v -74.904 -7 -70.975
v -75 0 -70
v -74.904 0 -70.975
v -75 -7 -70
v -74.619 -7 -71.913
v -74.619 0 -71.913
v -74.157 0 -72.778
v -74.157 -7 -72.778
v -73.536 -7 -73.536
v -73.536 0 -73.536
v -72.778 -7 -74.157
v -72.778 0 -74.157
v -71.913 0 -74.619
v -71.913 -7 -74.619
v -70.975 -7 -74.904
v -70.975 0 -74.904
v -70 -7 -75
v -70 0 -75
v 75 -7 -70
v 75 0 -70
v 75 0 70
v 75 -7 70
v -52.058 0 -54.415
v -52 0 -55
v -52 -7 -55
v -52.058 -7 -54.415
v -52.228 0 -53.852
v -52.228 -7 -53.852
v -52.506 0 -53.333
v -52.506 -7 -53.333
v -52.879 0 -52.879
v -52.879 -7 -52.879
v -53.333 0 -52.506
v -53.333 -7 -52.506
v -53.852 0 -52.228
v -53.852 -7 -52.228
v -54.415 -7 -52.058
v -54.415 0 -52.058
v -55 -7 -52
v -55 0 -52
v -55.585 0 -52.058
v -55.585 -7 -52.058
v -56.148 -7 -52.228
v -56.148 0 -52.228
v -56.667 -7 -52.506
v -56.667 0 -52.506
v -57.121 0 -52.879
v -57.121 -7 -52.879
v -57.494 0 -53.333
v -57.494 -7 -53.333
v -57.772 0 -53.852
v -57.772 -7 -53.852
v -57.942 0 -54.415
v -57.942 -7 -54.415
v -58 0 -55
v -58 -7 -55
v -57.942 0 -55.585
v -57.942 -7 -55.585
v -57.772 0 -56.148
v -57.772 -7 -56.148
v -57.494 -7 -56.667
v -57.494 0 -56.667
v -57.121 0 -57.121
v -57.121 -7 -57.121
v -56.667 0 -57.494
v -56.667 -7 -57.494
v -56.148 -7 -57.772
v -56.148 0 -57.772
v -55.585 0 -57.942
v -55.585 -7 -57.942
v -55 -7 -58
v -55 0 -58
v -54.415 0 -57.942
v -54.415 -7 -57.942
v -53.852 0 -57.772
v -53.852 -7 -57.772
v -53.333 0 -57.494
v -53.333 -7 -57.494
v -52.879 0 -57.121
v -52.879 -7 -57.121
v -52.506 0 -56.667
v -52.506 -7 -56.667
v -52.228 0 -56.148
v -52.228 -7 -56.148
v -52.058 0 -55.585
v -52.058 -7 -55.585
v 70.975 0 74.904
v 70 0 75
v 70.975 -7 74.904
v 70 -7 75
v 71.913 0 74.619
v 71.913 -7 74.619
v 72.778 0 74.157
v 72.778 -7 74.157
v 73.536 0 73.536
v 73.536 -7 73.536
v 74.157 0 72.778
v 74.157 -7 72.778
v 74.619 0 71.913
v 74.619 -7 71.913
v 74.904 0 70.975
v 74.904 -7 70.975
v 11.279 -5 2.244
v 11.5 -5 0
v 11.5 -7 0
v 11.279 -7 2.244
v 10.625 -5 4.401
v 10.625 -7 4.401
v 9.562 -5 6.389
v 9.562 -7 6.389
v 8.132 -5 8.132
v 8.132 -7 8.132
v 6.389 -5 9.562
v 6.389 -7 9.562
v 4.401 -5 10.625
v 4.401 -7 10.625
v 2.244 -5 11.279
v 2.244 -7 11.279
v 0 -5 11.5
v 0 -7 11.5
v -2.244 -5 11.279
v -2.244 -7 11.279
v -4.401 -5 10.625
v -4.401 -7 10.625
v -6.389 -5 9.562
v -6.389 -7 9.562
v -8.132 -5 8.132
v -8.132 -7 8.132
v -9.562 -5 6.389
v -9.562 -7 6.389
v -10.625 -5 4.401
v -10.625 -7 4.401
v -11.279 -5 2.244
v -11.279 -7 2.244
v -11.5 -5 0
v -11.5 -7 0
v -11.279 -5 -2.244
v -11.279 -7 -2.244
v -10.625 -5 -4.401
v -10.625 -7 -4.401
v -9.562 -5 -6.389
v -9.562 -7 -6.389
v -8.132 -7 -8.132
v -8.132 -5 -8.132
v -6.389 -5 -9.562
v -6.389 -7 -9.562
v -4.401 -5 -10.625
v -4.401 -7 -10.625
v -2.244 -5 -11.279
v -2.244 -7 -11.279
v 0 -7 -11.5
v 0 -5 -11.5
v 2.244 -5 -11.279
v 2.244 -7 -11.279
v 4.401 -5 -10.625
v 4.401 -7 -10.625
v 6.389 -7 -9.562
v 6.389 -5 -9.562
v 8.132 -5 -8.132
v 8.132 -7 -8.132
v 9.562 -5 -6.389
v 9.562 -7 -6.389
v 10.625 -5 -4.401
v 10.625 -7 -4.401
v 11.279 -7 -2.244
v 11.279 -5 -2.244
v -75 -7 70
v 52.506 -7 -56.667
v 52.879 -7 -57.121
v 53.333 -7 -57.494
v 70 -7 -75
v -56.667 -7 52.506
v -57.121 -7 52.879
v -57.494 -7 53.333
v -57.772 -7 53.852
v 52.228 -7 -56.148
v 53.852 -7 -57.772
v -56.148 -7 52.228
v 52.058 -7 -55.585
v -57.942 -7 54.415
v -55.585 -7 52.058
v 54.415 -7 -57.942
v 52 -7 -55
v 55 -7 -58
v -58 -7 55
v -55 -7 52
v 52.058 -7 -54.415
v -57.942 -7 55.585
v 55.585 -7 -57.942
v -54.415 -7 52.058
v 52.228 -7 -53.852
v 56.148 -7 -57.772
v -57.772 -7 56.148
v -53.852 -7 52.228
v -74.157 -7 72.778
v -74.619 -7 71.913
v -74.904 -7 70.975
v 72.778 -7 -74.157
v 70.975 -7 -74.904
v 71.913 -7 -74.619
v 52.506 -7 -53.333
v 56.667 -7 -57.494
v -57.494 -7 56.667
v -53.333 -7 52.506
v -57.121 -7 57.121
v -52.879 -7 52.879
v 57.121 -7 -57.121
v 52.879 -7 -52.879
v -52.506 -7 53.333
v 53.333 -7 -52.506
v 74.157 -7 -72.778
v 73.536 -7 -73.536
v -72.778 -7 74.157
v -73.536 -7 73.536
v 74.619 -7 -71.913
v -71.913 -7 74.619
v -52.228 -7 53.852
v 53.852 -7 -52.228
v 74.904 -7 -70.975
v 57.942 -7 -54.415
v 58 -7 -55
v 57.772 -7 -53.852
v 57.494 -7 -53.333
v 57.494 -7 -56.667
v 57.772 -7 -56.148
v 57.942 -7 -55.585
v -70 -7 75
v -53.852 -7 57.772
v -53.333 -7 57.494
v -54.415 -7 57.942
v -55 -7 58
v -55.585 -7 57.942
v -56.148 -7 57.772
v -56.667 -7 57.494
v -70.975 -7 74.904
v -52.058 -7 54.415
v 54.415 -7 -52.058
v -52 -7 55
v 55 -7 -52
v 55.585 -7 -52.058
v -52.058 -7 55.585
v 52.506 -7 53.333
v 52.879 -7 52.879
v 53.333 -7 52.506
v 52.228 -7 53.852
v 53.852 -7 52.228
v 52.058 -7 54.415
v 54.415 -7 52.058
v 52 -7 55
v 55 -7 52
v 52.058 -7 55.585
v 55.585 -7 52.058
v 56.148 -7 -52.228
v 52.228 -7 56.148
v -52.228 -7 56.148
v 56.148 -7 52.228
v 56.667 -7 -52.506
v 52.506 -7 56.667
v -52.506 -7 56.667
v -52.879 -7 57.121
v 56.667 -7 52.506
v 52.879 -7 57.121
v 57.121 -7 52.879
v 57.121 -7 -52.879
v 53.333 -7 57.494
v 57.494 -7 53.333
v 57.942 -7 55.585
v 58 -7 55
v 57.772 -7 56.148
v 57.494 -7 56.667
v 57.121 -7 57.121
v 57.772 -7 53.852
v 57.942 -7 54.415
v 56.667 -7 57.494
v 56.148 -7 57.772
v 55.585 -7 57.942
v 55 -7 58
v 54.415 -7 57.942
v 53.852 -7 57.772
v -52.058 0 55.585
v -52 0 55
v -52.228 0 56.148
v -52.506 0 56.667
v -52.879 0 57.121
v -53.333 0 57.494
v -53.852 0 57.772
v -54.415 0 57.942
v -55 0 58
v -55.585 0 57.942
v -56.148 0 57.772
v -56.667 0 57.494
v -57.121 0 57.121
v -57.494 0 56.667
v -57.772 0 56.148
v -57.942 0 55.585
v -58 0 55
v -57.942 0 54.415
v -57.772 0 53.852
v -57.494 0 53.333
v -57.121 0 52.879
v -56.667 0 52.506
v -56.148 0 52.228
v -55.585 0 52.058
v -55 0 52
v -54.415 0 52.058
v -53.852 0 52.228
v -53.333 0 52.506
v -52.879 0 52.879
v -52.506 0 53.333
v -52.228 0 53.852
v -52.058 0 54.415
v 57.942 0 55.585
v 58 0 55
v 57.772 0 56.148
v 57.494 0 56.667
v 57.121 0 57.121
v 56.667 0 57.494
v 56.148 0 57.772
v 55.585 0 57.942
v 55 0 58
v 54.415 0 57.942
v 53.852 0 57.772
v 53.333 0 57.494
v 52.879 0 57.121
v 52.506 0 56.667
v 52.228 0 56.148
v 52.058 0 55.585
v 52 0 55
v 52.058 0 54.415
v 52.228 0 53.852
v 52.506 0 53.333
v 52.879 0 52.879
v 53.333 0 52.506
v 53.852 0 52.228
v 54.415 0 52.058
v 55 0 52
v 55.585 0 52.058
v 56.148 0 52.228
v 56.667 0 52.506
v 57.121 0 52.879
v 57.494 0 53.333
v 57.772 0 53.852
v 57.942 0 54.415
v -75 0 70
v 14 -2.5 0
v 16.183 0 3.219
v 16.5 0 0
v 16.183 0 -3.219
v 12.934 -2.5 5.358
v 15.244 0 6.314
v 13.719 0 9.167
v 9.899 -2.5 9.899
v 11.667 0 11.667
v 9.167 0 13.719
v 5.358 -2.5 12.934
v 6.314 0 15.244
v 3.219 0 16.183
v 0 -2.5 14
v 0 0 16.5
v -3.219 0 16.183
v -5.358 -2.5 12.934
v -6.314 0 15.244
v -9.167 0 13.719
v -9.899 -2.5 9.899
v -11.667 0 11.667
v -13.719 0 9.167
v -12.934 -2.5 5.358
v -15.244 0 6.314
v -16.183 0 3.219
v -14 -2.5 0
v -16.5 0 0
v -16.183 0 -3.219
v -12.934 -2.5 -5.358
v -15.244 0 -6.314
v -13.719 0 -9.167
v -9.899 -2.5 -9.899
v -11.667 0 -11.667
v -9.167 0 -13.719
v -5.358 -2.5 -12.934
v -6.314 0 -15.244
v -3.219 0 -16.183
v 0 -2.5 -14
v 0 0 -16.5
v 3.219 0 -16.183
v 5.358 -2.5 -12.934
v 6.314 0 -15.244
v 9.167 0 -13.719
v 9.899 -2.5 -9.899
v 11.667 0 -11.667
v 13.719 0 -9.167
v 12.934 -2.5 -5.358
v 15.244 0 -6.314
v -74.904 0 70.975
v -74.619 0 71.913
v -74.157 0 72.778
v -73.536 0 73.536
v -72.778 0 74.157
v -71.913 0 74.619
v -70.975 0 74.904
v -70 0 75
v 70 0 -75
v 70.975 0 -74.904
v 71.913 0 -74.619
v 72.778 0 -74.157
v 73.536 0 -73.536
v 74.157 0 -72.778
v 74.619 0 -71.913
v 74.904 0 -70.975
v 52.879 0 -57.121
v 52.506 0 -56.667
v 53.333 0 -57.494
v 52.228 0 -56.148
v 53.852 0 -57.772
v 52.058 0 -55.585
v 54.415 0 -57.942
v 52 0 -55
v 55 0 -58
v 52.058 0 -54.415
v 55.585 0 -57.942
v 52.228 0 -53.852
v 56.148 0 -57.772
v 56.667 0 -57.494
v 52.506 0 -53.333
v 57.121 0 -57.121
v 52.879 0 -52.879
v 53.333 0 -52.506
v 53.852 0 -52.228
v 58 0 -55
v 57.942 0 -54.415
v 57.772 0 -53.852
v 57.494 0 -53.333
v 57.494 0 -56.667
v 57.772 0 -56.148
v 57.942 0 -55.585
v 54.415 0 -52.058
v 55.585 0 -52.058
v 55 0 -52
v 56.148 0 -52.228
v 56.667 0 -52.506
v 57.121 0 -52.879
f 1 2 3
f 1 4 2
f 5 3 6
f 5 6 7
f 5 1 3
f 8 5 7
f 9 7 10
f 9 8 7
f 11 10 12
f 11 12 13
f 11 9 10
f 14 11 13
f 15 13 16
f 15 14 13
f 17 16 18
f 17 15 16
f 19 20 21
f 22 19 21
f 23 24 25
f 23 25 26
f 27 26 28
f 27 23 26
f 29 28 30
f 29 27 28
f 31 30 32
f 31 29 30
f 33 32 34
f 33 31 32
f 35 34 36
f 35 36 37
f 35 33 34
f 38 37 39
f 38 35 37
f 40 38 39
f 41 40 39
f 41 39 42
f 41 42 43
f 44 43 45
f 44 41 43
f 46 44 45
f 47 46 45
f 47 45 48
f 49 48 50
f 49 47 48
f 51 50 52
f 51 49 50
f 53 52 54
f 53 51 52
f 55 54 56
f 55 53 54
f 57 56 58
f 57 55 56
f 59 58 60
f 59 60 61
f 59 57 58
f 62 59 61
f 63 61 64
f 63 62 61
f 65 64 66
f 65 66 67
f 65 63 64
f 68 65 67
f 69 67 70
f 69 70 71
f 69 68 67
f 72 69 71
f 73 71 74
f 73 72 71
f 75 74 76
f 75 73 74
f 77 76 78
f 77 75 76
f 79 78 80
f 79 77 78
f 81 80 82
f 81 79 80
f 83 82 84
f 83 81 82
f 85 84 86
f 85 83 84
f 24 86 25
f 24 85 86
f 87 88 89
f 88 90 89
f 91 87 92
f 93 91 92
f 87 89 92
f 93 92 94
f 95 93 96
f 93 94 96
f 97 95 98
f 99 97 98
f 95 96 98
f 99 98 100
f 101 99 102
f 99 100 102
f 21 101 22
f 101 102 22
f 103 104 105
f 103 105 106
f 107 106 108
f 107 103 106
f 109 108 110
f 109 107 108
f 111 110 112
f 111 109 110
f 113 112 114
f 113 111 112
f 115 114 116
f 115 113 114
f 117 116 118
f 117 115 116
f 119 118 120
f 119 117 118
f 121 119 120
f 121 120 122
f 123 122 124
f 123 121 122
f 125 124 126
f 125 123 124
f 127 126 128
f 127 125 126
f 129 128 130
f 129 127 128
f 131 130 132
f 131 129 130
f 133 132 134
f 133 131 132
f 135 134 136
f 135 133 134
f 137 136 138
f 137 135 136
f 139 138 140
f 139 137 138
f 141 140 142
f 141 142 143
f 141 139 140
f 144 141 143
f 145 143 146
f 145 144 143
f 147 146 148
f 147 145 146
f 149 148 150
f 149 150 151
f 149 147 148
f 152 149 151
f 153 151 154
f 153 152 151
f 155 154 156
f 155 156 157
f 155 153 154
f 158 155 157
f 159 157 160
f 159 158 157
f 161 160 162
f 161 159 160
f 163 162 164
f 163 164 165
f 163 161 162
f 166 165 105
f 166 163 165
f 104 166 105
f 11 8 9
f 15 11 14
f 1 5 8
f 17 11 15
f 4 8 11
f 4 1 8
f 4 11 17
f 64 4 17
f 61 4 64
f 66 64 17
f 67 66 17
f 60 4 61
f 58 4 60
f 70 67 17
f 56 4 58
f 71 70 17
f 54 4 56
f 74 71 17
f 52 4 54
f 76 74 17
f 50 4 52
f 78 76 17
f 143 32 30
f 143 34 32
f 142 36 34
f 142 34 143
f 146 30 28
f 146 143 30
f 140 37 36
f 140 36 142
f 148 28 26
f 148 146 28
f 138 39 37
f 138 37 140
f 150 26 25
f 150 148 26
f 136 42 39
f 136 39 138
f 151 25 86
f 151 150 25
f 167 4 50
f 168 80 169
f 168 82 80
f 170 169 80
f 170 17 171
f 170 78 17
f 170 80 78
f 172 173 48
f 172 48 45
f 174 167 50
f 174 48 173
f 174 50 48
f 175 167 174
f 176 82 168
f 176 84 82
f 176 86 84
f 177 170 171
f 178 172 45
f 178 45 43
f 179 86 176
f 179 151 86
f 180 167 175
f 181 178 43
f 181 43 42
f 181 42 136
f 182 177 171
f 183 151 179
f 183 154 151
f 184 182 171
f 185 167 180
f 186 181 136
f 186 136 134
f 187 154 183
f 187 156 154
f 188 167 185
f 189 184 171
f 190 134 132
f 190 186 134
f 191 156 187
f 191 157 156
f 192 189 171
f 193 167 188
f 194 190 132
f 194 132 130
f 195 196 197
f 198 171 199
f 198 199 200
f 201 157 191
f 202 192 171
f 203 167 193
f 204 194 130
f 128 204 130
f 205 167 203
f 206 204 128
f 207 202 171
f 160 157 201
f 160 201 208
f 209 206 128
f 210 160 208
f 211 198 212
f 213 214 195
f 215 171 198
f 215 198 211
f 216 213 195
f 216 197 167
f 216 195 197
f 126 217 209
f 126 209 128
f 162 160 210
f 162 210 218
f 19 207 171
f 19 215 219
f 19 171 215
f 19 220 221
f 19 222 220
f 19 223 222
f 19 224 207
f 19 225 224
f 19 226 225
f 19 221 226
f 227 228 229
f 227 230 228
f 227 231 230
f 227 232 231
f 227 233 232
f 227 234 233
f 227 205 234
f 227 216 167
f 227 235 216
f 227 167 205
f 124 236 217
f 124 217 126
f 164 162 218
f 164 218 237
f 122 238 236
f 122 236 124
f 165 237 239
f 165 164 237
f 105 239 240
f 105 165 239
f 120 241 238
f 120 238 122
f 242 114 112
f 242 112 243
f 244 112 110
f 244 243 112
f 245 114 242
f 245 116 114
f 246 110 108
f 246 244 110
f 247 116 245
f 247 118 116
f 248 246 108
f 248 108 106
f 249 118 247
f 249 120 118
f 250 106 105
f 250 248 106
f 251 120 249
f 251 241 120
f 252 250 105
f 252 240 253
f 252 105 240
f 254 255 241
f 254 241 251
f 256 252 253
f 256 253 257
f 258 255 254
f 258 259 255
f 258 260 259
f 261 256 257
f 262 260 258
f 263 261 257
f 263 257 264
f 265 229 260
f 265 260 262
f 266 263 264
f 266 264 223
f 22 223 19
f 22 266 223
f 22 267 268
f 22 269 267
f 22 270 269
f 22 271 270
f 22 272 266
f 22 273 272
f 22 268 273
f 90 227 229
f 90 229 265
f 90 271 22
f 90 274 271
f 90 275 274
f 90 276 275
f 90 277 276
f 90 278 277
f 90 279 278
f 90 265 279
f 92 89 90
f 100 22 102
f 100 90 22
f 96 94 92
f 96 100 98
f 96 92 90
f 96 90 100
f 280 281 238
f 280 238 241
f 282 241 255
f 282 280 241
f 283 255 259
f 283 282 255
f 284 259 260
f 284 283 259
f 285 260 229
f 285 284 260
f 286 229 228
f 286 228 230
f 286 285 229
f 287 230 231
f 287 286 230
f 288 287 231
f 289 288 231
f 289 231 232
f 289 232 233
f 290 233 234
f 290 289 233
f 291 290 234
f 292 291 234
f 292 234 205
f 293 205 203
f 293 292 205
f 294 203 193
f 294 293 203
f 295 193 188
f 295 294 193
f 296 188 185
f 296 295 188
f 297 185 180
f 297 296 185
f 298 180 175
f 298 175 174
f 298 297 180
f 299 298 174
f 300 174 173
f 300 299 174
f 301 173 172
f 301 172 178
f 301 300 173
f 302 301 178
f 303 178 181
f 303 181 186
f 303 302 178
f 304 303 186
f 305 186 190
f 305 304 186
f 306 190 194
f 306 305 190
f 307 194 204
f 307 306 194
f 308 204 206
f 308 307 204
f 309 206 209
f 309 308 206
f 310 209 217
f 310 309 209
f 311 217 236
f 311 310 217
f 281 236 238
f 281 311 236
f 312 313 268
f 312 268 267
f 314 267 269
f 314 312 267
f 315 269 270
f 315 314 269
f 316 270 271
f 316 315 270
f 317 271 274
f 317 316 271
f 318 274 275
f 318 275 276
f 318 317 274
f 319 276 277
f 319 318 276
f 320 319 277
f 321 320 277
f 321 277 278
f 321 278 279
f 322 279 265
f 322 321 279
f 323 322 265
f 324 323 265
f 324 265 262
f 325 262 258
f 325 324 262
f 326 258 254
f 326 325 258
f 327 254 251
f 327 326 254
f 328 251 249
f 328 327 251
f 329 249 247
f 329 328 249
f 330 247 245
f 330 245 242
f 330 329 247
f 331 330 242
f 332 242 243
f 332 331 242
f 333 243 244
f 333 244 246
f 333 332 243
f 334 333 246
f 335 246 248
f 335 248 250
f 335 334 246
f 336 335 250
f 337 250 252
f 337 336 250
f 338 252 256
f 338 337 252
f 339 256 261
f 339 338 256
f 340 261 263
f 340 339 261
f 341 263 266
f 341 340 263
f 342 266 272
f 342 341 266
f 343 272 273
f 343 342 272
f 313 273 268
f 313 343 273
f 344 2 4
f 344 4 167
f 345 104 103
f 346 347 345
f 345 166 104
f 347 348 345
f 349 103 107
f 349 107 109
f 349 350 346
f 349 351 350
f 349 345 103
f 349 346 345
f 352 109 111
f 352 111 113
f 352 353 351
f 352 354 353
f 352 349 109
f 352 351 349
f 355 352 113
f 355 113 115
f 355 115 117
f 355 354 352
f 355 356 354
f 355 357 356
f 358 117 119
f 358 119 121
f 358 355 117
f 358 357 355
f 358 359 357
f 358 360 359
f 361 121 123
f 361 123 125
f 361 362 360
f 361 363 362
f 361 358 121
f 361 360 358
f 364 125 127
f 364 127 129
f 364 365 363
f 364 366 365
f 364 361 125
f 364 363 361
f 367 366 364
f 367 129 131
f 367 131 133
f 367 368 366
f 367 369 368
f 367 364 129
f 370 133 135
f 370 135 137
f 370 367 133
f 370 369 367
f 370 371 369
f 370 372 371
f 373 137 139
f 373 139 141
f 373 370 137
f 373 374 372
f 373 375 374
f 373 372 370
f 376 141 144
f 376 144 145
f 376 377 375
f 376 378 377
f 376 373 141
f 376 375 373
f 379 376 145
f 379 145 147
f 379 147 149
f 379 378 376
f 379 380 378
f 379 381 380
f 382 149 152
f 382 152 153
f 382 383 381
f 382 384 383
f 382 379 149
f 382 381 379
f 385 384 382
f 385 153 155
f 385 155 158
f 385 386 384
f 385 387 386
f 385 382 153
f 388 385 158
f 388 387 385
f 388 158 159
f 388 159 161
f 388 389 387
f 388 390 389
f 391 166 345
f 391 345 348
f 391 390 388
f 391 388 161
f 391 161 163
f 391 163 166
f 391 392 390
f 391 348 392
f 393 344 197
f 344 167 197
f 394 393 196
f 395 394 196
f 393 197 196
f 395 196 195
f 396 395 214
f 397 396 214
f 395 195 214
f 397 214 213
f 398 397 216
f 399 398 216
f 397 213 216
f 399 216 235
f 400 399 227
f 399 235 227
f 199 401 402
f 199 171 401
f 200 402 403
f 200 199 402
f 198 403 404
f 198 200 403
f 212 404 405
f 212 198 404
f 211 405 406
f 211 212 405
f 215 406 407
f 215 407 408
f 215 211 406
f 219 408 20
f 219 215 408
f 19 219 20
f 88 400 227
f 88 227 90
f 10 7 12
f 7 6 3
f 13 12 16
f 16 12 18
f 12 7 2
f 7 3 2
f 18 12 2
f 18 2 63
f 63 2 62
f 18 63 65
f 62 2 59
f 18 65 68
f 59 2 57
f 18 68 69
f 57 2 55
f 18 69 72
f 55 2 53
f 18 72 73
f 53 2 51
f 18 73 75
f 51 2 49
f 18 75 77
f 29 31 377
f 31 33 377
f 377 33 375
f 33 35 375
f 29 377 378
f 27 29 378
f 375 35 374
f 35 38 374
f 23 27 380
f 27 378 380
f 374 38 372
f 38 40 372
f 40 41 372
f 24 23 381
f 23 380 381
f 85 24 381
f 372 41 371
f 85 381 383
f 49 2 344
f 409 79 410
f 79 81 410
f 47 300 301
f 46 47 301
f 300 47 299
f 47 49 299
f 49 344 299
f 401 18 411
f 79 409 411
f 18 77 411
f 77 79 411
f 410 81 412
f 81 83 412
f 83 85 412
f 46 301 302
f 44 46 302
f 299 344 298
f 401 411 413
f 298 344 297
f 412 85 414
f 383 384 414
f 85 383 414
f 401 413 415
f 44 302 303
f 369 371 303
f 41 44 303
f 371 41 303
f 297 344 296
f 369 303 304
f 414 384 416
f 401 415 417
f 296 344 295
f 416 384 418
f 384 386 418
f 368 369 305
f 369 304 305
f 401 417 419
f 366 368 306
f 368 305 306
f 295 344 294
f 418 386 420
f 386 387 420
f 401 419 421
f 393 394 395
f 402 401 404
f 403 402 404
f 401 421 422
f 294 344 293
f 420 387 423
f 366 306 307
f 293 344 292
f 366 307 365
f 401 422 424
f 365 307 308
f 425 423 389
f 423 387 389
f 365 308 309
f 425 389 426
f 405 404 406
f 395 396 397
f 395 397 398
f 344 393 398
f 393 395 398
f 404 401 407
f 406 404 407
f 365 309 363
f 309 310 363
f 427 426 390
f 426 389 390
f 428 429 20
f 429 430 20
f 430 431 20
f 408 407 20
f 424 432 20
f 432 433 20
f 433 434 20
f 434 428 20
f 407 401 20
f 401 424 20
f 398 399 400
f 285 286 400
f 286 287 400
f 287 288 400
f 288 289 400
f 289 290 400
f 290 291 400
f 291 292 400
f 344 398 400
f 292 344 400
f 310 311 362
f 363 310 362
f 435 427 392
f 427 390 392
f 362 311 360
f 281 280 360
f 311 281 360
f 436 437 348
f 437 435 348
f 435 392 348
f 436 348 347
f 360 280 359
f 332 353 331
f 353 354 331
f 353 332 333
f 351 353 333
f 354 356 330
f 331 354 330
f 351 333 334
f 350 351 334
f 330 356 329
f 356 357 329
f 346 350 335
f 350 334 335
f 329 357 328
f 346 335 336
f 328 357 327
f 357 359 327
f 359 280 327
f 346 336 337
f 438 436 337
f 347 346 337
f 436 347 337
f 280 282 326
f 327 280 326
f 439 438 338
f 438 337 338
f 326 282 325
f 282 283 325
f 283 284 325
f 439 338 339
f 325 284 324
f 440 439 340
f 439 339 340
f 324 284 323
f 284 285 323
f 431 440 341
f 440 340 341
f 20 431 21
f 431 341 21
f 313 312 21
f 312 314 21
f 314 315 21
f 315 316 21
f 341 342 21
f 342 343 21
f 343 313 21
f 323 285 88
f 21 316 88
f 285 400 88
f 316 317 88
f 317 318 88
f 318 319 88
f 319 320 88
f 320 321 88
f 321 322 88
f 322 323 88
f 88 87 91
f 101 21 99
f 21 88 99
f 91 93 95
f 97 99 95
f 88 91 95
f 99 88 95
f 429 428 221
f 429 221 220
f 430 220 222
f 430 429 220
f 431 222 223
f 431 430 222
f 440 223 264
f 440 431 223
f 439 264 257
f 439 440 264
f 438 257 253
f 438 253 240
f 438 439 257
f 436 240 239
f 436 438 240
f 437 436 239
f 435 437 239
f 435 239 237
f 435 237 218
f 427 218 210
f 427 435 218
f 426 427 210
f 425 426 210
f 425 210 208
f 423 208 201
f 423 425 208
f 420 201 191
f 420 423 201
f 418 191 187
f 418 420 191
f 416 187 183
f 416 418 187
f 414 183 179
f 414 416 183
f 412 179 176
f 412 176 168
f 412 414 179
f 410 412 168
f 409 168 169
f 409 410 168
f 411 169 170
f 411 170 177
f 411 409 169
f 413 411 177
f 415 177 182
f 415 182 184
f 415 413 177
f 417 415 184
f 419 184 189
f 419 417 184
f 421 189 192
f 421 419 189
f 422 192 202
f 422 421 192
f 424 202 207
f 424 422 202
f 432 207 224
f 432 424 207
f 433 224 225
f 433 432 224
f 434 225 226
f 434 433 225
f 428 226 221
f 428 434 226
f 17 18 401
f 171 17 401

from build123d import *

# Parameters (mm, degrees)
F0_W     = 150
F0_H     = 150
F0_R     = 3
F0_R_2   = 11.5
F1_DEPTH = 7
F2_SIZE  = 5
F3_R     = 5


with BuildPart() as f1:
    # F0 (on Front) → F1 (new body)
    with BuildSketch(Plane.XZ):
        Rectangle(F0_W, F0_H)
        with Locations((-55, -55)):
            Circle(F0_R, mode=Mode.SUBTRACT)
        with Locations((55, -55)):
            Circle(F0_R, mode=Mode.SUBTRACT)
        with Locations((-55, 55)):
            Circle(F0_R, mode=Mode.SUBTRACT)
        Circle(F0_R_2, mode=Mode.SUBTRACT)
        with Locations((55, 55)):
            Circle(F0_R, mode=Mode.SUBTRACT)
    extrude(amount=F1_DEPTH)

    # F2
    f2_edges = [f1.edges().sort_by_distance(p)[0] for p in [
        (-11.5, 0, 0),
    ]]
    chamfer(f2_edges, length=F2_SIZE)

    # F3
    f3_edges = [f1.edges().sort_by_distance(p)[0] for p in [
        (75, -3.5, 75),
        (-75, -3.5, 75),
        (-75, -3.5, -75),
        (75, -3.5, -75),
    ]]
    fillet(f3_edges, radius=F3_R)


solid = f1.part
